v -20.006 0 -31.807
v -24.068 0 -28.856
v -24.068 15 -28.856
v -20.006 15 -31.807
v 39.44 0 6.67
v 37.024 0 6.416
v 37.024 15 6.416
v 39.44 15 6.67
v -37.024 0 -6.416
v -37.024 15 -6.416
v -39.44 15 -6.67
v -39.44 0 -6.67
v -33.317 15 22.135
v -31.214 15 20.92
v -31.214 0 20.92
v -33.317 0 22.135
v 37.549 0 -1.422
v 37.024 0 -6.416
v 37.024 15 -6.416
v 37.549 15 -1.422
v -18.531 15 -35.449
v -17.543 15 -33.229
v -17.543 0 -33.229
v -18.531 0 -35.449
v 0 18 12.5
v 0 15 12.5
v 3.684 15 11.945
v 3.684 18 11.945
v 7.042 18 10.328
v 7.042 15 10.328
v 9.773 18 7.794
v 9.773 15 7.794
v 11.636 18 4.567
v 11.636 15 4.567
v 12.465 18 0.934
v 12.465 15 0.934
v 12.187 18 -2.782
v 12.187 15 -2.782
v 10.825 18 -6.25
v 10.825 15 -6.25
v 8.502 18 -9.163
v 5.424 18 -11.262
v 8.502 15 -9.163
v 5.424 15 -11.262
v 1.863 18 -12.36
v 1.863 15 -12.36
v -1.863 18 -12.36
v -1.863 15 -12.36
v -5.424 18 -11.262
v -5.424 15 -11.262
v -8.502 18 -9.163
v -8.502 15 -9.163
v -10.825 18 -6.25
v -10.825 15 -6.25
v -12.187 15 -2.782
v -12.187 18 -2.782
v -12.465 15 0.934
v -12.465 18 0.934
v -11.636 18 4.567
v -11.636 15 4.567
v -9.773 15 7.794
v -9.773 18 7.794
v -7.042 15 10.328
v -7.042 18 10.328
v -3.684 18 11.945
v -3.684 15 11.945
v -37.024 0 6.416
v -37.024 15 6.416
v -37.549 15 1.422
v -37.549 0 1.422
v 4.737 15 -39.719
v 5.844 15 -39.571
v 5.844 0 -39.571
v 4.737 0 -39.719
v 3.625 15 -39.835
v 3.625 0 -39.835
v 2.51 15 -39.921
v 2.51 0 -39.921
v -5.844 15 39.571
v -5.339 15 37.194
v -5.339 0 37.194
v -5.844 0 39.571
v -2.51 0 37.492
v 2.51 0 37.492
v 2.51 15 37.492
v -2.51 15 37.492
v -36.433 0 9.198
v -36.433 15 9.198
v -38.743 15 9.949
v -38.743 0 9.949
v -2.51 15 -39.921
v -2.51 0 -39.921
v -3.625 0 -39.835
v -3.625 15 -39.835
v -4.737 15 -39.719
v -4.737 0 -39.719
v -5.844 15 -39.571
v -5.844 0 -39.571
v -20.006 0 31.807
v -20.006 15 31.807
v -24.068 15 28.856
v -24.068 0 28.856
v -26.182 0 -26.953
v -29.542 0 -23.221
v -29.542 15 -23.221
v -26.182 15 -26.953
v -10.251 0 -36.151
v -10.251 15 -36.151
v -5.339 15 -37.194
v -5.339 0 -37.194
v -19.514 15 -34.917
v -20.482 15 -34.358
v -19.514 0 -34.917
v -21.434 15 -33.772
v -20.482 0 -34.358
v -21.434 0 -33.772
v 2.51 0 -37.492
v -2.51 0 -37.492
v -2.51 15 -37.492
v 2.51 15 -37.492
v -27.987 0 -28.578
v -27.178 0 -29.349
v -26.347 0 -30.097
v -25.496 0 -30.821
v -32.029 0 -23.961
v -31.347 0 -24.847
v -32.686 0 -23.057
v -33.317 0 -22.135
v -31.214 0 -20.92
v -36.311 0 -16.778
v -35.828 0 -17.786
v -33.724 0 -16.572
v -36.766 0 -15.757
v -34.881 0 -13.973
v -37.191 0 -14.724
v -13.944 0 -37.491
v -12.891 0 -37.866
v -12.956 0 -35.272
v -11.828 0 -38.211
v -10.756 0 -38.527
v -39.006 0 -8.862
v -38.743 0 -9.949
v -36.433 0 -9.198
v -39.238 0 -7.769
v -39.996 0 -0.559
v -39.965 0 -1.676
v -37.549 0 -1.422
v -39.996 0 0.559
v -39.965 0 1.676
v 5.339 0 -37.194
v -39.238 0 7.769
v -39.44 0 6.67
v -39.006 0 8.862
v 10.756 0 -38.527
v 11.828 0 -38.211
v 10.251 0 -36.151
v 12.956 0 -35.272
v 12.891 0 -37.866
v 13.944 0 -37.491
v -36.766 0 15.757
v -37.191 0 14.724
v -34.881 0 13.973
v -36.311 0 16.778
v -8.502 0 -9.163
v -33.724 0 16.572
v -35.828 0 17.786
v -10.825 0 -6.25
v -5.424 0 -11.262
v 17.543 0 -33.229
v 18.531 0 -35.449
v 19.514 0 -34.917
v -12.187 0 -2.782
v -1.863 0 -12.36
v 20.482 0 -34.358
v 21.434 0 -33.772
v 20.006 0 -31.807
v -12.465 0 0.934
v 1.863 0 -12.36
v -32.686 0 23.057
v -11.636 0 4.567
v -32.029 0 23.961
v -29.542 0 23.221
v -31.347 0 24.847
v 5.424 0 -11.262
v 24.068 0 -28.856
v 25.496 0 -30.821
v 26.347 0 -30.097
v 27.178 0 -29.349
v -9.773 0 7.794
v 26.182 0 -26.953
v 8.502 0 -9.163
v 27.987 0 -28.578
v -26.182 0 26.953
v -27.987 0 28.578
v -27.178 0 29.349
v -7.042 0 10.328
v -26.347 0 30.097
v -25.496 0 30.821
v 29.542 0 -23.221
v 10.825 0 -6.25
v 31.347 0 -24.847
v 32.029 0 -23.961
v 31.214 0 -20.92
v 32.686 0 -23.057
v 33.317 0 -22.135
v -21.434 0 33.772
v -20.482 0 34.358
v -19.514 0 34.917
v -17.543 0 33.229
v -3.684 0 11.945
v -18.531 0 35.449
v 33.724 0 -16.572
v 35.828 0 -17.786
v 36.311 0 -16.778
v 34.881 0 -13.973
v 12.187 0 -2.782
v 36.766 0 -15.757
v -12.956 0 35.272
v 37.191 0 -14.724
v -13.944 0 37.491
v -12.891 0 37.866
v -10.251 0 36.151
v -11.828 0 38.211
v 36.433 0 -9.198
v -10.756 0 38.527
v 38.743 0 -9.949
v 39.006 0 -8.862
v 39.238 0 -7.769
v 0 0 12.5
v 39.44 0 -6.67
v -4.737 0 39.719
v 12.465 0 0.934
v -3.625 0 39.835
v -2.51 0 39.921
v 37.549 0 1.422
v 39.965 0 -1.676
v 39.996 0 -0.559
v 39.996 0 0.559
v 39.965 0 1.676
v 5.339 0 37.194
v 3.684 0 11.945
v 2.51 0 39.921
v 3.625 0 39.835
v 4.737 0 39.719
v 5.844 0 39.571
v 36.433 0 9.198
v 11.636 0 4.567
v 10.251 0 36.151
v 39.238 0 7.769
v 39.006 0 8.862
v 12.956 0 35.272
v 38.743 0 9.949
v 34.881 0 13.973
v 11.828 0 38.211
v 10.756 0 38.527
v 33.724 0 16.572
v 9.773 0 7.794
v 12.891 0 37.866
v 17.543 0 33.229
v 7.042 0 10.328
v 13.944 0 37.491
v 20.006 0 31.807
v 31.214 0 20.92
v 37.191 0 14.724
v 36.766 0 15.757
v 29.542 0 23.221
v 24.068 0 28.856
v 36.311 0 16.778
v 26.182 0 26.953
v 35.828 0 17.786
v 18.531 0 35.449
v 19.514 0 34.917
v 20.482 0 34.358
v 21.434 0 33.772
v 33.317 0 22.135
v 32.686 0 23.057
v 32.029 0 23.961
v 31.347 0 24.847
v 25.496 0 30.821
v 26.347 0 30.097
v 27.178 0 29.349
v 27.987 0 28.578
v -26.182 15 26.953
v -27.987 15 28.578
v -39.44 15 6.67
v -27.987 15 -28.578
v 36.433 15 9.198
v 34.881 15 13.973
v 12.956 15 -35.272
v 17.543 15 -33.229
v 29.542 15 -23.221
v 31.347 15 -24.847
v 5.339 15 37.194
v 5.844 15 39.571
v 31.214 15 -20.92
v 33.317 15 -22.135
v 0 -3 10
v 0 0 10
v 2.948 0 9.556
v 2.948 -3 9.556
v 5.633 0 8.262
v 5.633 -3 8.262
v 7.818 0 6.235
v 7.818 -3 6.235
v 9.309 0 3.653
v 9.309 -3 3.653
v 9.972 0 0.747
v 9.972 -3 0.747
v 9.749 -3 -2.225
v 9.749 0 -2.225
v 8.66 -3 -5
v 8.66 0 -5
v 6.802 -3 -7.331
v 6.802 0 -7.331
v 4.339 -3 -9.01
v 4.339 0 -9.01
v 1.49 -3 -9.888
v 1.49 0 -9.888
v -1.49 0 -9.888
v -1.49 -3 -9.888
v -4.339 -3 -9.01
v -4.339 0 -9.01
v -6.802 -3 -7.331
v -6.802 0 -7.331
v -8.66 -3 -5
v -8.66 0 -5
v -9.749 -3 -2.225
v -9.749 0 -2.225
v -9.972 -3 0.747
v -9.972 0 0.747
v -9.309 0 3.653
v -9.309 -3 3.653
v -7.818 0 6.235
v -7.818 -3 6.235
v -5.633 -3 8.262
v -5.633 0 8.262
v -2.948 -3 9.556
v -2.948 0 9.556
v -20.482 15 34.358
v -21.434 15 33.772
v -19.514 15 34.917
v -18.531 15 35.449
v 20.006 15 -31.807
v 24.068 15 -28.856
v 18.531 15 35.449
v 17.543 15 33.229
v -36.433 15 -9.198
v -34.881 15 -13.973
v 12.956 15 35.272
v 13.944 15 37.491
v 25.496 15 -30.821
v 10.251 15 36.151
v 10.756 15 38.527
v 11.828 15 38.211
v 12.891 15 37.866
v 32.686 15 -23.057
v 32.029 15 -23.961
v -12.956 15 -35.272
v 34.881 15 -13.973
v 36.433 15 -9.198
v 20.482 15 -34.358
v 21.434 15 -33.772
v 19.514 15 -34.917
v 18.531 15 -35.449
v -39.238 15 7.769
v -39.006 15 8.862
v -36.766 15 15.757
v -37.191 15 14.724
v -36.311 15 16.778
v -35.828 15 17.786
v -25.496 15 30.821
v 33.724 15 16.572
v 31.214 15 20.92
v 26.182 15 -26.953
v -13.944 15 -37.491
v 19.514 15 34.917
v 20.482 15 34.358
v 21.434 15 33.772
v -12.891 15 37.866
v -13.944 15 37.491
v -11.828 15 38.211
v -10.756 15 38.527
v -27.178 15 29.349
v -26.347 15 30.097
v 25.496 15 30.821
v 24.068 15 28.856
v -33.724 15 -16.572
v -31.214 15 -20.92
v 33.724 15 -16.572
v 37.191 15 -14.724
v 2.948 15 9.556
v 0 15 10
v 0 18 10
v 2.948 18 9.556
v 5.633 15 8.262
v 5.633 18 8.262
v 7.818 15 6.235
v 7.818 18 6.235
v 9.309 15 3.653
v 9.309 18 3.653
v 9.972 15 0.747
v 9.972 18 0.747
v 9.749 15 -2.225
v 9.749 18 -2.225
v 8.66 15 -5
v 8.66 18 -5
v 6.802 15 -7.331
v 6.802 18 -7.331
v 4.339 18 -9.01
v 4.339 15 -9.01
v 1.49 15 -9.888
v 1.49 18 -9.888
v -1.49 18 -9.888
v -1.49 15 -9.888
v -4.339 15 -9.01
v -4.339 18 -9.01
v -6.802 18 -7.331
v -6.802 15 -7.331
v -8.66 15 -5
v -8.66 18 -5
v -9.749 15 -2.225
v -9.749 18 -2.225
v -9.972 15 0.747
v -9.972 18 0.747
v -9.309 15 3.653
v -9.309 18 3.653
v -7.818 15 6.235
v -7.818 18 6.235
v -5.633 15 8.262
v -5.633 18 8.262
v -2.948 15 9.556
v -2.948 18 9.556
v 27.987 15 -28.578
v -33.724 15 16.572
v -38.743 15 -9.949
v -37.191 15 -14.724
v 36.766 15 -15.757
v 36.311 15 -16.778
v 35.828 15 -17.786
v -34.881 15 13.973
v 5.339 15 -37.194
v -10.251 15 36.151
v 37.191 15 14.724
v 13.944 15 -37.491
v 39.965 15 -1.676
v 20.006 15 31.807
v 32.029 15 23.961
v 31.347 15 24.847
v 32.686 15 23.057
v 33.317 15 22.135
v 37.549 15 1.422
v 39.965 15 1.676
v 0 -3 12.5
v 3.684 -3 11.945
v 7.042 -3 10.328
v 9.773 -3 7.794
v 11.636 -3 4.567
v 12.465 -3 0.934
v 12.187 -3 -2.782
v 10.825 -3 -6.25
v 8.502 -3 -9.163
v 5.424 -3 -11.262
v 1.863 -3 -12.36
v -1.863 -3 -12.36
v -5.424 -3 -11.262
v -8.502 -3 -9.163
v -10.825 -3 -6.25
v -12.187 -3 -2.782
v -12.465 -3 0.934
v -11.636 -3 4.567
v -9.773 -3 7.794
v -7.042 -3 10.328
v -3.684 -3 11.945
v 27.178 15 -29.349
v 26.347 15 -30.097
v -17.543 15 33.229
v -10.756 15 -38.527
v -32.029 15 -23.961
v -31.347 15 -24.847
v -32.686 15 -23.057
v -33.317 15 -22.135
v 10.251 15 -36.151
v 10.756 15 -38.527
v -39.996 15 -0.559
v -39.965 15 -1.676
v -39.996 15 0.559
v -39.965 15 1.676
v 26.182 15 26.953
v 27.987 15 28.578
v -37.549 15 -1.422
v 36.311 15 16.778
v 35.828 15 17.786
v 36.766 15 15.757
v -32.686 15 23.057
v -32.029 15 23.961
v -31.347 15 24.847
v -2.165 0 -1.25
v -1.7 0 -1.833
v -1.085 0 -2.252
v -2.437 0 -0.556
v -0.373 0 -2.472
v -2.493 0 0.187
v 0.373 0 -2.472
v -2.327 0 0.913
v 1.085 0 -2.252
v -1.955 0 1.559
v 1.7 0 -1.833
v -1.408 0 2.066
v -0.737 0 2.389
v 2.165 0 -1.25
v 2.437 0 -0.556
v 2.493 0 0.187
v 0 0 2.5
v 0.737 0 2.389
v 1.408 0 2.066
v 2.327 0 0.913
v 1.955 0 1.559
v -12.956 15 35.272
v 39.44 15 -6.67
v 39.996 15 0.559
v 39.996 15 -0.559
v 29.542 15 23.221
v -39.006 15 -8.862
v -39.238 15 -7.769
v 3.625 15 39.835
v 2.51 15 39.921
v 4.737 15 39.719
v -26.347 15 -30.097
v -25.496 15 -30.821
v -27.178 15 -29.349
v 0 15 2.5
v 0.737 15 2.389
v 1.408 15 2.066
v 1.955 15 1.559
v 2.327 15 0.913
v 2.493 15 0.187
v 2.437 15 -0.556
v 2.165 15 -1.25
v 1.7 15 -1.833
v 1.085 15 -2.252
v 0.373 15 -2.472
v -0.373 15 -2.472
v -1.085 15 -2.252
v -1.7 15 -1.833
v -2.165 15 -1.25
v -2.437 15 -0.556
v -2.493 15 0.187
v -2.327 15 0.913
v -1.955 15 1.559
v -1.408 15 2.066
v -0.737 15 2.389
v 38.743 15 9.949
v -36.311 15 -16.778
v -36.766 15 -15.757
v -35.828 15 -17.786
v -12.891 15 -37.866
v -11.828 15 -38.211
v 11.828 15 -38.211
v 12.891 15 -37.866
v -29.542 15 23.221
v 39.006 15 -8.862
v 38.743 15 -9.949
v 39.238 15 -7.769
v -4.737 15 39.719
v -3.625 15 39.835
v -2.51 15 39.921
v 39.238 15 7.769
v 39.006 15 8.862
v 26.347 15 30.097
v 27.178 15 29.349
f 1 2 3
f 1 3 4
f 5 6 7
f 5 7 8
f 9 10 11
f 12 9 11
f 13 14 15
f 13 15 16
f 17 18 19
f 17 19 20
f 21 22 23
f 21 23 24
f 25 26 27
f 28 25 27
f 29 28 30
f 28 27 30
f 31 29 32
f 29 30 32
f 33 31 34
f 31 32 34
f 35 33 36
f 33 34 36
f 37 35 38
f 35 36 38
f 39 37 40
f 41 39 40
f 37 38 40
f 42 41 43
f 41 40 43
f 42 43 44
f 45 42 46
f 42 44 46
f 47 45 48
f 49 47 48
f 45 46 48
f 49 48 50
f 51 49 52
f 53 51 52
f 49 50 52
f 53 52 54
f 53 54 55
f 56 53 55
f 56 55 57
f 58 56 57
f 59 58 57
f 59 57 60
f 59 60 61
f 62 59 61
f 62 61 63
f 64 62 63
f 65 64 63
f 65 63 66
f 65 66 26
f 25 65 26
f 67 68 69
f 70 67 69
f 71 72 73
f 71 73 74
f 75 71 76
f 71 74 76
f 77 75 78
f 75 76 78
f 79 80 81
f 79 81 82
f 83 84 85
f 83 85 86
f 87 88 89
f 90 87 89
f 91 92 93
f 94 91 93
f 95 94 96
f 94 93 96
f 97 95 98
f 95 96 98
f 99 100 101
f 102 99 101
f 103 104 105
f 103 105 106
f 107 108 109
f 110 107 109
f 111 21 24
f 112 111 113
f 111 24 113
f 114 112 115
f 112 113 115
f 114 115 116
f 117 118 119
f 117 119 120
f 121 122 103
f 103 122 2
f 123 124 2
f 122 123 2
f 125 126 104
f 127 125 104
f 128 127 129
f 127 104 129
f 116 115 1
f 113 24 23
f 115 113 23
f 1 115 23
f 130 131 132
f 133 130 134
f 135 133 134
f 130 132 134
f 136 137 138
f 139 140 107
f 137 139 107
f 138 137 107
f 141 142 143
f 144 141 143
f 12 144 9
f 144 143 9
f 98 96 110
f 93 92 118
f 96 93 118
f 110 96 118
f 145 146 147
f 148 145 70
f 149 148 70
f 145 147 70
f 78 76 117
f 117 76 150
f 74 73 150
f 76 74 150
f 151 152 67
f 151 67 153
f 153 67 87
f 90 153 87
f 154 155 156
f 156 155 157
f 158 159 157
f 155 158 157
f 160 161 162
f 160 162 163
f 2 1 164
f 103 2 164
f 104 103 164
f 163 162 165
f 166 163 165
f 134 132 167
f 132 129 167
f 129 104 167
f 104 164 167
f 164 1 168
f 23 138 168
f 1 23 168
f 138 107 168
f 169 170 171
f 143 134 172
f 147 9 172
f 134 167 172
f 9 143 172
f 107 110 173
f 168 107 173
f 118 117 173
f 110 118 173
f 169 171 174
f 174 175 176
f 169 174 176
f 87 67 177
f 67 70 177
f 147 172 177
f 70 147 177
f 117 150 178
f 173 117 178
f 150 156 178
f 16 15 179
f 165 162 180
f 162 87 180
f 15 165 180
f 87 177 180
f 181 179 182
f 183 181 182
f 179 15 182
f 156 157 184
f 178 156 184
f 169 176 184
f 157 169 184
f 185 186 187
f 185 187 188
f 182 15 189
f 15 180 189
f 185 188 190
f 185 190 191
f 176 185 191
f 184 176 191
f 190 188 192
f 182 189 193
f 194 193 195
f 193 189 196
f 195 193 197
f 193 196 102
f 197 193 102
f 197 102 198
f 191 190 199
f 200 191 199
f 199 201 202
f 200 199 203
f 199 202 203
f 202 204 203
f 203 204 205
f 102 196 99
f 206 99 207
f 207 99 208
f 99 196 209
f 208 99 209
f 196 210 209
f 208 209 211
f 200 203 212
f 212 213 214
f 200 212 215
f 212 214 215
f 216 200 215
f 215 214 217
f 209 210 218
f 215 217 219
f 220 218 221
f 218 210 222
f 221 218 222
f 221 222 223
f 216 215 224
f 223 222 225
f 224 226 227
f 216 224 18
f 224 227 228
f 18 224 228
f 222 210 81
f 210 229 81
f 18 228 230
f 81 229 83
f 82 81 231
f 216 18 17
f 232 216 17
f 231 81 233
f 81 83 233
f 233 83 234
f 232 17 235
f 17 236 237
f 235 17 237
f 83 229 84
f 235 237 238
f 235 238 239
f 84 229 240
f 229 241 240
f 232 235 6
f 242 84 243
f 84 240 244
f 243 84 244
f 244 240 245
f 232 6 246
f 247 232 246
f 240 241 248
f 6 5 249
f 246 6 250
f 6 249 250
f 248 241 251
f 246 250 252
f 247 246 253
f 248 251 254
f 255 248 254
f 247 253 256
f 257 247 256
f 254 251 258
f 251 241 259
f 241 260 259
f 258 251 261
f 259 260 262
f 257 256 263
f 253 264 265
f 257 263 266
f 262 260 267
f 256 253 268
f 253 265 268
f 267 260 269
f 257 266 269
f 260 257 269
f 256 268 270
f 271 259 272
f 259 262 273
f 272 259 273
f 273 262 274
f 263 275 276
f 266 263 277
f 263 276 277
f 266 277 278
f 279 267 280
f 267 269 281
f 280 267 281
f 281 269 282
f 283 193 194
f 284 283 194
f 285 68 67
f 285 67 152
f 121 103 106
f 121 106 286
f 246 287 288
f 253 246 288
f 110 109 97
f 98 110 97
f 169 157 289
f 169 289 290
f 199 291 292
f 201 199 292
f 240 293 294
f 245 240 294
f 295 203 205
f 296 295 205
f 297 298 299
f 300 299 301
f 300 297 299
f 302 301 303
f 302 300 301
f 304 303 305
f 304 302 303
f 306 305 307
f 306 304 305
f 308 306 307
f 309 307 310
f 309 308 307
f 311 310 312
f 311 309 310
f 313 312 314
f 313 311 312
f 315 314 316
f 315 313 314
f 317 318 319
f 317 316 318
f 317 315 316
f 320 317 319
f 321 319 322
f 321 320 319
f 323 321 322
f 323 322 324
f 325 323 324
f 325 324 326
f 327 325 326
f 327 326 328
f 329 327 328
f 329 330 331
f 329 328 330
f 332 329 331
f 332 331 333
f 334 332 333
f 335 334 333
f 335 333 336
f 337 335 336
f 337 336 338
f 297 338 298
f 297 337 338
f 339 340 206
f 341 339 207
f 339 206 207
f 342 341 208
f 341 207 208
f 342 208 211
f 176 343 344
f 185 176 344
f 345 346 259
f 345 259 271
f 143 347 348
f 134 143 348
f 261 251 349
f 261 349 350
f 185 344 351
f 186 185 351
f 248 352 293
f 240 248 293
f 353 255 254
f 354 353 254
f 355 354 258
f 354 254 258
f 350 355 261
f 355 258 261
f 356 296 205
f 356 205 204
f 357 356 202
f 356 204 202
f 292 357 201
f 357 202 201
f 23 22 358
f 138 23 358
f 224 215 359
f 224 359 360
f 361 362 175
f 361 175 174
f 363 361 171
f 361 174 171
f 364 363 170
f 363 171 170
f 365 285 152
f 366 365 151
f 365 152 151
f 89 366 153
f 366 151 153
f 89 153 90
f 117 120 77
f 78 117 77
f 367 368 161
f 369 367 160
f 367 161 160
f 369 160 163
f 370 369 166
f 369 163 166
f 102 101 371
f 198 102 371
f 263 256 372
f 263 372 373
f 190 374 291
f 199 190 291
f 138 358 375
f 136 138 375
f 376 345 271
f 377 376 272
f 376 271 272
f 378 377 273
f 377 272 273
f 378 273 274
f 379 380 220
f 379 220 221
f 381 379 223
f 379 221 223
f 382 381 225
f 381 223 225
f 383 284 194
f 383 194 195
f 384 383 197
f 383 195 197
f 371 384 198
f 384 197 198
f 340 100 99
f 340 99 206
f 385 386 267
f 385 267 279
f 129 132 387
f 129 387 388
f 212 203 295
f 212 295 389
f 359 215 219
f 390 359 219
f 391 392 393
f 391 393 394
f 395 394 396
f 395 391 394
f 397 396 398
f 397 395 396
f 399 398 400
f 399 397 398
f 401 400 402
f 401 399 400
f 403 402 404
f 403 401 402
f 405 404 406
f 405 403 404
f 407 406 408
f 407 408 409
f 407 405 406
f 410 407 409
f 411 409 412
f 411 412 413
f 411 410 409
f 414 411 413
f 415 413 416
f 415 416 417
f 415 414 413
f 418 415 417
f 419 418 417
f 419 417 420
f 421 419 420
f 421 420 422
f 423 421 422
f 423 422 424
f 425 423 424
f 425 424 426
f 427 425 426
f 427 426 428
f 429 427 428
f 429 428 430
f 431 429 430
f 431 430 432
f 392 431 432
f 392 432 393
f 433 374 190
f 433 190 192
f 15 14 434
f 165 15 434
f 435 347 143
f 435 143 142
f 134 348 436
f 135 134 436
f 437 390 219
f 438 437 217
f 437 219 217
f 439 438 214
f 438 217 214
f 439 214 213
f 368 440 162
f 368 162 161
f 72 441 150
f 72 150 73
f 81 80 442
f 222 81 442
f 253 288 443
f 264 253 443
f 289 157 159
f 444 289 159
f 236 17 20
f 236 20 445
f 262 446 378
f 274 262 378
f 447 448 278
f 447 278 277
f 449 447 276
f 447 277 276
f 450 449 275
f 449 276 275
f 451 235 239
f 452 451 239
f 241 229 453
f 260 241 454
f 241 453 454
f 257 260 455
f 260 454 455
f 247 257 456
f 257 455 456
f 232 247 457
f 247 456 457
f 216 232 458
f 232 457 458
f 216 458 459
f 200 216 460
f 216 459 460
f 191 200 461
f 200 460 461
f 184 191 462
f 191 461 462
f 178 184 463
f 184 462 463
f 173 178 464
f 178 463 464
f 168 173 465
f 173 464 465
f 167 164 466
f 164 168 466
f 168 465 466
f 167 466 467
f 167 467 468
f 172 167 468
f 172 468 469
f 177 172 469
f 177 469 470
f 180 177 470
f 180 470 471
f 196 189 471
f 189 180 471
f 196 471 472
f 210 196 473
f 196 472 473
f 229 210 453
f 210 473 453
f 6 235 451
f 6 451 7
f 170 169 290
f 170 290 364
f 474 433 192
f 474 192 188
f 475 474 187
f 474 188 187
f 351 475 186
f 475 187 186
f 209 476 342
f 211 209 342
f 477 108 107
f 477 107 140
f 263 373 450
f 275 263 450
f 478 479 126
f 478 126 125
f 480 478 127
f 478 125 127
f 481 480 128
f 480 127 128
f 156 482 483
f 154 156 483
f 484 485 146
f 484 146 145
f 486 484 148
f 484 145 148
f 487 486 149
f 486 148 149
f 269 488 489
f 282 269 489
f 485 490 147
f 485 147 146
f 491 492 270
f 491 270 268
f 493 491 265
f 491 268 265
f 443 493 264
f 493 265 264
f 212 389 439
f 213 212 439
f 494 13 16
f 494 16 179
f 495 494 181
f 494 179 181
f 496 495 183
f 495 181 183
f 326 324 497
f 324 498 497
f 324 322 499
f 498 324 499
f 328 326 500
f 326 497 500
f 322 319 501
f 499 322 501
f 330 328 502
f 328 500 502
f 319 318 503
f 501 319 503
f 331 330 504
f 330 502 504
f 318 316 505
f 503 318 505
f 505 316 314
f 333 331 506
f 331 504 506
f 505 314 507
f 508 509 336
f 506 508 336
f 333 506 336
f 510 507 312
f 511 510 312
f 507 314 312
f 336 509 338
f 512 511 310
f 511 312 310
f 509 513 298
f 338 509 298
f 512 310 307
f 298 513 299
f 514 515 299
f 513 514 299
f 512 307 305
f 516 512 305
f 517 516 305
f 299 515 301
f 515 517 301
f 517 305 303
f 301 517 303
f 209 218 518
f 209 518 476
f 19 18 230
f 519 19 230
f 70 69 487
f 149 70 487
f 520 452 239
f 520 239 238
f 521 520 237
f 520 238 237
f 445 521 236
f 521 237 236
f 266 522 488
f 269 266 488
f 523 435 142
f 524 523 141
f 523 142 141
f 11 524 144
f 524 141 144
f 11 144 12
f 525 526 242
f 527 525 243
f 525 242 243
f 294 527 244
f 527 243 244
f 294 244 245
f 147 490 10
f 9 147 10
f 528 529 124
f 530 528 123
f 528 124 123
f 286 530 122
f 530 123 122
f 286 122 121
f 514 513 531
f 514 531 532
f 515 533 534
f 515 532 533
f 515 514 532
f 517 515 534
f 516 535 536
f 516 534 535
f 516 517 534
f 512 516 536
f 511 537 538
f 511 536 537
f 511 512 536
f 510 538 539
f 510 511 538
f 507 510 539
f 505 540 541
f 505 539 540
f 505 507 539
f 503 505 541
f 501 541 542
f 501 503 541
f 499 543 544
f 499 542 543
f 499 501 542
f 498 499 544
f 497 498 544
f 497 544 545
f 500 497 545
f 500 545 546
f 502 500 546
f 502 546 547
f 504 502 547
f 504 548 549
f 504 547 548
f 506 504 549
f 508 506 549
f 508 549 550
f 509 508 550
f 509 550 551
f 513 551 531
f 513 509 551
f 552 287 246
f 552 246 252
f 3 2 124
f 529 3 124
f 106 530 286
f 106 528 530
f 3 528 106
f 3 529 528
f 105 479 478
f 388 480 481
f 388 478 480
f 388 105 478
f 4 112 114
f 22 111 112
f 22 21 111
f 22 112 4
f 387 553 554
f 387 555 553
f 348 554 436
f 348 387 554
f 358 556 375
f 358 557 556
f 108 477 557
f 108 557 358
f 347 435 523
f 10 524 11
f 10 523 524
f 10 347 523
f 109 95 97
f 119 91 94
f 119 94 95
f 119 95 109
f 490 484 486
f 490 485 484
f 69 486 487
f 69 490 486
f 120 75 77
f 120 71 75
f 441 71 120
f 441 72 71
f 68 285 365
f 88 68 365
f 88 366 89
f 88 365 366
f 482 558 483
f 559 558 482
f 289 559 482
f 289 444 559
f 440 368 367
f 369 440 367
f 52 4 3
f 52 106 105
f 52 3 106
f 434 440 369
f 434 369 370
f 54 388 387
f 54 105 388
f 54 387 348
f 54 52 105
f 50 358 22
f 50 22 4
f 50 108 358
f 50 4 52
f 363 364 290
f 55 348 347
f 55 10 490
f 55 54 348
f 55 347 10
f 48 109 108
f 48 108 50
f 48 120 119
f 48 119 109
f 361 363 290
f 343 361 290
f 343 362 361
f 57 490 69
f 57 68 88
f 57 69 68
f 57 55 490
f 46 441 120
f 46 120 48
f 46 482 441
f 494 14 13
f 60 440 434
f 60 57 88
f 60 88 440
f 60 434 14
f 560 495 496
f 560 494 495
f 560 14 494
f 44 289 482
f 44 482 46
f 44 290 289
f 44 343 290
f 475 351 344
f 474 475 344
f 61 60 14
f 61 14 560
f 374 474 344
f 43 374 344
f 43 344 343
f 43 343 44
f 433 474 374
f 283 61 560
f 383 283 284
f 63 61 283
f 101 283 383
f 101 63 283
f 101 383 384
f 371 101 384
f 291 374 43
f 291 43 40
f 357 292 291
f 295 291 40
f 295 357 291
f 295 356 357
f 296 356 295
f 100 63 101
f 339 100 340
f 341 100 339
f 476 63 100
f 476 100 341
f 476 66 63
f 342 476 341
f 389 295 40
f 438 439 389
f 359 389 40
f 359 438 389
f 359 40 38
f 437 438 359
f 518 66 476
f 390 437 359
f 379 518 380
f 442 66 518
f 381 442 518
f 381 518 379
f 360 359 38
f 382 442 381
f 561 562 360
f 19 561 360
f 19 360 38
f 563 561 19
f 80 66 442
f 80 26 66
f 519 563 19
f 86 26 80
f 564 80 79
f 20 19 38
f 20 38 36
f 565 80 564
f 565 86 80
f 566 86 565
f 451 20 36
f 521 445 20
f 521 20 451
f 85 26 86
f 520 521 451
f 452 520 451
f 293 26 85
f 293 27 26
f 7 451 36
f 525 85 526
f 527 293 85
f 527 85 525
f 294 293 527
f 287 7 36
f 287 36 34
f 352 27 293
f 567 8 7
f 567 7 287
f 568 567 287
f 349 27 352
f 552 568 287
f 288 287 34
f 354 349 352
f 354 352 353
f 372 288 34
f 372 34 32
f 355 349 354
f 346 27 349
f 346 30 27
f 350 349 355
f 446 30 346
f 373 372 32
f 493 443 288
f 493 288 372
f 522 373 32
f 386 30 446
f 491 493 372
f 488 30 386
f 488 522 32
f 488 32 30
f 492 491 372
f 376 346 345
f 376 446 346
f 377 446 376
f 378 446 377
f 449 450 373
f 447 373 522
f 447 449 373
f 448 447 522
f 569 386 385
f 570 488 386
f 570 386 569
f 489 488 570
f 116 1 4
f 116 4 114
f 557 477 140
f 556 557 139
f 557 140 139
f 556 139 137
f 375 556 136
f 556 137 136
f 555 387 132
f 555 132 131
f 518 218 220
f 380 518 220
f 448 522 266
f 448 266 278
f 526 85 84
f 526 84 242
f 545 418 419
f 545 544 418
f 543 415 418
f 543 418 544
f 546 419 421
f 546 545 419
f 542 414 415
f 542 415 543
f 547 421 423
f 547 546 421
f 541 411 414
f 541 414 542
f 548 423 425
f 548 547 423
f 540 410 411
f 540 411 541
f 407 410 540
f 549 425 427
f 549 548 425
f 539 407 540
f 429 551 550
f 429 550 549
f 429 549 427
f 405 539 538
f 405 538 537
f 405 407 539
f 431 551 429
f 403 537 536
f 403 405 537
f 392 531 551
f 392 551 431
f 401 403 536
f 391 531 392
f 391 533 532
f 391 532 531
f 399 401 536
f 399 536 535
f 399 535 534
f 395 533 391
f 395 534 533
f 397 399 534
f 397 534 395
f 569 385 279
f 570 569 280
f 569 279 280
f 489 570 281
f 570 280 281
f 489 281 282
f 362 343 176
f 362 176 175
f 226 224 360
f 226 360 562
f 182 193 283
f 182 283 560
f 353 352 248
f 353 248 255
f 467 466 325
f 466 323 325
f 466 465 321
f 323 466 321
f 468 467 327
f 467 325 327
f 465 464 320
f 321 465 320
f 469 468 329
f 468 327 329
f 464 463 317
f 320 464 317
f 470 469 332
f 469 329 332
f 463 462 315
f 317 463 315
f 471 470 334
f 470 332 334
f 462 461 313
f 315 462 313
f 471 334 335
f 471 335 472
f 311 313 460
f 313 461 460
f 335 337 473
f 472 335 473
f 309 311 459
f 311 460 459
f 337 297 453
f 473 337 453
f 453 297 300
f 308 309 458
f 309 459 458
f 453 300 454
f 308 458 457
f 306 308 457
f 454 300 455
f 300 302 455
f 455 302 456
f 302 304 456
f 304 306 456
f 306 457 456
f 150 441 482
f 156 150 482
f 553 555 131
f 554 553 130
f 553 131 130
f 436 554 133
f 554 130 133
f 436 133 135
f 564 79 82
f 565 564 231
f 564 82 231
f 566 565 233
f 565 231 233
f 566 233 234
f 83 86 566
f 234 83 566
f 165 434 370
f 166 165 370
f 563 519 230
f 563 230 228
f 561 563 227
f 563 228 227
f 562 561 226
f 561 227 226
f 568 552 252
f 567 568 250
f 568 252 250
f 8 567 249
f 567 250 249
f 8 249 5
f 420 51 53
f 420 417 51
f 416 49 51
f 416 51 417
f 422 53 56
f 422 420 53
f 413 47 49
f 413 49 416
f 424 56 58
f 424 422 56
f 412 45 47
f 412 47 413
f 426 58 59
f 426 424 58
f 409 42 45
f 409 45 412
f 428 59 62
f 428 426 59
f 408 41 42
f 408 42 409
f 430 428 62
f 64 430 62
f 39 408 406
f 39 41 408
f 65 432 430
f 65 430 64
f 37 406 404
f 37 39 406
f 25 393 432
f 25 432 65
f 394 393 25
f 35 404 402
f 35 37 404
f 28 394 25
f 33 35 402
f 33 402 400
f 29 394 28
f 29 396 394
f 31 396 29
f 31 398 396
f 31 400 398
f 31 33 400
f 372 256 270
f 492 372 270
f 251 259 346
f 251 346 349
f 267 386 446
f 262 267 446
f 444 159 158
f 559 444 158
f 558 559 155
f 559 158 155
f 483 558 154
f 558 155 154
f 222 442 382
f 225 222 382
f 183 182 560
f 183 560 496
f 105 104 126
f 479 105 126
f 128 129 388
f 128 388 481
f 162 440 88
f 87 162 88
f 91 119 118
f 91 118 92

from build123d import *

# Parameters (mm, degrees)
CROQUIS1_R                   = 40
SALIENTE_EXTRUIR1_DEPTH      = 15
CORTAR_EXTRUIR1_START        = -16
CROQUIS2_W                   = 5.020915278
CROQUIS2_H                   = 5.016516428
CORTAR_EXTRUIR1_DEPTH        = 68
MATRIZC1_COUNT               = 30
SALIENTE_EXTRUIR2_DEPTH      = 18
SALIENTE_EXTRUIR2_DEPTH_BACK = 3
CROQUIS3_R                   = 12.5
CROQUIS3_R_2                 = 10
CORTAR_EXTRUIR2_DEPTH        = 60
CORTAR_EXTRUIR2_DEPTH_BACK   = 27
CROQUIS4_R                   = 2.5


with BuildPart() as part:
    # Croquis1 → Saliente-Extruir1 (new body)
    with BuildSketch(Plane(origin=(0, 0, 0), x_dir=(1, 0, 0), z_dir=(0, 1, 0))):
        with Locations(Location((0, 0, 0), (0, 0, 270))):
            Circle(CROQUIS1_R)
    extrude(amount=SALIENTE_EXTRUIR1_DEPTH)

    # Croquis2 → Cortar-Extruir1 (cut)
    with BuildSketch(Plane(origin=(0, 0, 0), x_dir=(1, 0, 0), z_dir=(0, 1, 0)).offset(CORTAR_EXTRUIR1_START)):
        with Locations((0, 40)):
            Rectangle(CROQUIS2_W, CROQUIS2_H)
    cortar_extruir1 = extrude(amount=CORTAR_EXTRUIR1_DEPTH, mode=Mode.SUBTRACT)

    # MatrizC1: Cortar-Extruir1 ×30 about axis
    matrizc1_axis = Axis((0, 0, 0), (0, 1, 0))
    for i in range(1, MATRIZC1_COUNT):
        add(cortar_extruir1.rotate(matrizc1_axis, i * 360 / MATRIZC1_COUNT), mode=Mode.SUBTRACT)

    # Croquis3 → Saliente-Extruir2 (add, two sides: drawn at the far end of the back side and taken through both)
    with BuildSketch(Plane(origin=(0, 0, 0), x_dir=(1, 0, 0), z_dir=(0, 1, 0)).offset(-SALIENTE_EXTRUIR2_DEPTH_BACK)):
        with Locations(Location((0, 0, 0), (0, 0, 270))):
            Circle(CROQUIS3_R)
        with Locations(Location((0, 0, 0), (0, 0, 270))):
            Circle(CROQUIS3_R_2, mode=Mode.SUBTRACT)
    extrude(amount=SALIENTE_EXTRUIR2_DEPTH + SALIENTE_EXTRUIR2_DEPTH_BACK)

    # Croquis4 → Cortar-Extruir2 (cut, two sides: drawn at the far end of the back side and taken through both)
    with BuildSketch(Plane(origin=(0, 0, 0), x_dir=(1, 0, 0), z_dir=(0, 1, 0)).offset(-CORTAR_EXTRUIR2_DEPTH_BACK)):
        with Locations(Location((0, 0, 0), (0, 0, 270))):
            Circle(CROQUIS4_R)
    extrude(amount=CORTAR_EXTRUIR2_DEPTH + CORTAR_EXTRUIR2_DEPTH_BACK, mode=Mode.SUBTRACT)


solid = part.part
